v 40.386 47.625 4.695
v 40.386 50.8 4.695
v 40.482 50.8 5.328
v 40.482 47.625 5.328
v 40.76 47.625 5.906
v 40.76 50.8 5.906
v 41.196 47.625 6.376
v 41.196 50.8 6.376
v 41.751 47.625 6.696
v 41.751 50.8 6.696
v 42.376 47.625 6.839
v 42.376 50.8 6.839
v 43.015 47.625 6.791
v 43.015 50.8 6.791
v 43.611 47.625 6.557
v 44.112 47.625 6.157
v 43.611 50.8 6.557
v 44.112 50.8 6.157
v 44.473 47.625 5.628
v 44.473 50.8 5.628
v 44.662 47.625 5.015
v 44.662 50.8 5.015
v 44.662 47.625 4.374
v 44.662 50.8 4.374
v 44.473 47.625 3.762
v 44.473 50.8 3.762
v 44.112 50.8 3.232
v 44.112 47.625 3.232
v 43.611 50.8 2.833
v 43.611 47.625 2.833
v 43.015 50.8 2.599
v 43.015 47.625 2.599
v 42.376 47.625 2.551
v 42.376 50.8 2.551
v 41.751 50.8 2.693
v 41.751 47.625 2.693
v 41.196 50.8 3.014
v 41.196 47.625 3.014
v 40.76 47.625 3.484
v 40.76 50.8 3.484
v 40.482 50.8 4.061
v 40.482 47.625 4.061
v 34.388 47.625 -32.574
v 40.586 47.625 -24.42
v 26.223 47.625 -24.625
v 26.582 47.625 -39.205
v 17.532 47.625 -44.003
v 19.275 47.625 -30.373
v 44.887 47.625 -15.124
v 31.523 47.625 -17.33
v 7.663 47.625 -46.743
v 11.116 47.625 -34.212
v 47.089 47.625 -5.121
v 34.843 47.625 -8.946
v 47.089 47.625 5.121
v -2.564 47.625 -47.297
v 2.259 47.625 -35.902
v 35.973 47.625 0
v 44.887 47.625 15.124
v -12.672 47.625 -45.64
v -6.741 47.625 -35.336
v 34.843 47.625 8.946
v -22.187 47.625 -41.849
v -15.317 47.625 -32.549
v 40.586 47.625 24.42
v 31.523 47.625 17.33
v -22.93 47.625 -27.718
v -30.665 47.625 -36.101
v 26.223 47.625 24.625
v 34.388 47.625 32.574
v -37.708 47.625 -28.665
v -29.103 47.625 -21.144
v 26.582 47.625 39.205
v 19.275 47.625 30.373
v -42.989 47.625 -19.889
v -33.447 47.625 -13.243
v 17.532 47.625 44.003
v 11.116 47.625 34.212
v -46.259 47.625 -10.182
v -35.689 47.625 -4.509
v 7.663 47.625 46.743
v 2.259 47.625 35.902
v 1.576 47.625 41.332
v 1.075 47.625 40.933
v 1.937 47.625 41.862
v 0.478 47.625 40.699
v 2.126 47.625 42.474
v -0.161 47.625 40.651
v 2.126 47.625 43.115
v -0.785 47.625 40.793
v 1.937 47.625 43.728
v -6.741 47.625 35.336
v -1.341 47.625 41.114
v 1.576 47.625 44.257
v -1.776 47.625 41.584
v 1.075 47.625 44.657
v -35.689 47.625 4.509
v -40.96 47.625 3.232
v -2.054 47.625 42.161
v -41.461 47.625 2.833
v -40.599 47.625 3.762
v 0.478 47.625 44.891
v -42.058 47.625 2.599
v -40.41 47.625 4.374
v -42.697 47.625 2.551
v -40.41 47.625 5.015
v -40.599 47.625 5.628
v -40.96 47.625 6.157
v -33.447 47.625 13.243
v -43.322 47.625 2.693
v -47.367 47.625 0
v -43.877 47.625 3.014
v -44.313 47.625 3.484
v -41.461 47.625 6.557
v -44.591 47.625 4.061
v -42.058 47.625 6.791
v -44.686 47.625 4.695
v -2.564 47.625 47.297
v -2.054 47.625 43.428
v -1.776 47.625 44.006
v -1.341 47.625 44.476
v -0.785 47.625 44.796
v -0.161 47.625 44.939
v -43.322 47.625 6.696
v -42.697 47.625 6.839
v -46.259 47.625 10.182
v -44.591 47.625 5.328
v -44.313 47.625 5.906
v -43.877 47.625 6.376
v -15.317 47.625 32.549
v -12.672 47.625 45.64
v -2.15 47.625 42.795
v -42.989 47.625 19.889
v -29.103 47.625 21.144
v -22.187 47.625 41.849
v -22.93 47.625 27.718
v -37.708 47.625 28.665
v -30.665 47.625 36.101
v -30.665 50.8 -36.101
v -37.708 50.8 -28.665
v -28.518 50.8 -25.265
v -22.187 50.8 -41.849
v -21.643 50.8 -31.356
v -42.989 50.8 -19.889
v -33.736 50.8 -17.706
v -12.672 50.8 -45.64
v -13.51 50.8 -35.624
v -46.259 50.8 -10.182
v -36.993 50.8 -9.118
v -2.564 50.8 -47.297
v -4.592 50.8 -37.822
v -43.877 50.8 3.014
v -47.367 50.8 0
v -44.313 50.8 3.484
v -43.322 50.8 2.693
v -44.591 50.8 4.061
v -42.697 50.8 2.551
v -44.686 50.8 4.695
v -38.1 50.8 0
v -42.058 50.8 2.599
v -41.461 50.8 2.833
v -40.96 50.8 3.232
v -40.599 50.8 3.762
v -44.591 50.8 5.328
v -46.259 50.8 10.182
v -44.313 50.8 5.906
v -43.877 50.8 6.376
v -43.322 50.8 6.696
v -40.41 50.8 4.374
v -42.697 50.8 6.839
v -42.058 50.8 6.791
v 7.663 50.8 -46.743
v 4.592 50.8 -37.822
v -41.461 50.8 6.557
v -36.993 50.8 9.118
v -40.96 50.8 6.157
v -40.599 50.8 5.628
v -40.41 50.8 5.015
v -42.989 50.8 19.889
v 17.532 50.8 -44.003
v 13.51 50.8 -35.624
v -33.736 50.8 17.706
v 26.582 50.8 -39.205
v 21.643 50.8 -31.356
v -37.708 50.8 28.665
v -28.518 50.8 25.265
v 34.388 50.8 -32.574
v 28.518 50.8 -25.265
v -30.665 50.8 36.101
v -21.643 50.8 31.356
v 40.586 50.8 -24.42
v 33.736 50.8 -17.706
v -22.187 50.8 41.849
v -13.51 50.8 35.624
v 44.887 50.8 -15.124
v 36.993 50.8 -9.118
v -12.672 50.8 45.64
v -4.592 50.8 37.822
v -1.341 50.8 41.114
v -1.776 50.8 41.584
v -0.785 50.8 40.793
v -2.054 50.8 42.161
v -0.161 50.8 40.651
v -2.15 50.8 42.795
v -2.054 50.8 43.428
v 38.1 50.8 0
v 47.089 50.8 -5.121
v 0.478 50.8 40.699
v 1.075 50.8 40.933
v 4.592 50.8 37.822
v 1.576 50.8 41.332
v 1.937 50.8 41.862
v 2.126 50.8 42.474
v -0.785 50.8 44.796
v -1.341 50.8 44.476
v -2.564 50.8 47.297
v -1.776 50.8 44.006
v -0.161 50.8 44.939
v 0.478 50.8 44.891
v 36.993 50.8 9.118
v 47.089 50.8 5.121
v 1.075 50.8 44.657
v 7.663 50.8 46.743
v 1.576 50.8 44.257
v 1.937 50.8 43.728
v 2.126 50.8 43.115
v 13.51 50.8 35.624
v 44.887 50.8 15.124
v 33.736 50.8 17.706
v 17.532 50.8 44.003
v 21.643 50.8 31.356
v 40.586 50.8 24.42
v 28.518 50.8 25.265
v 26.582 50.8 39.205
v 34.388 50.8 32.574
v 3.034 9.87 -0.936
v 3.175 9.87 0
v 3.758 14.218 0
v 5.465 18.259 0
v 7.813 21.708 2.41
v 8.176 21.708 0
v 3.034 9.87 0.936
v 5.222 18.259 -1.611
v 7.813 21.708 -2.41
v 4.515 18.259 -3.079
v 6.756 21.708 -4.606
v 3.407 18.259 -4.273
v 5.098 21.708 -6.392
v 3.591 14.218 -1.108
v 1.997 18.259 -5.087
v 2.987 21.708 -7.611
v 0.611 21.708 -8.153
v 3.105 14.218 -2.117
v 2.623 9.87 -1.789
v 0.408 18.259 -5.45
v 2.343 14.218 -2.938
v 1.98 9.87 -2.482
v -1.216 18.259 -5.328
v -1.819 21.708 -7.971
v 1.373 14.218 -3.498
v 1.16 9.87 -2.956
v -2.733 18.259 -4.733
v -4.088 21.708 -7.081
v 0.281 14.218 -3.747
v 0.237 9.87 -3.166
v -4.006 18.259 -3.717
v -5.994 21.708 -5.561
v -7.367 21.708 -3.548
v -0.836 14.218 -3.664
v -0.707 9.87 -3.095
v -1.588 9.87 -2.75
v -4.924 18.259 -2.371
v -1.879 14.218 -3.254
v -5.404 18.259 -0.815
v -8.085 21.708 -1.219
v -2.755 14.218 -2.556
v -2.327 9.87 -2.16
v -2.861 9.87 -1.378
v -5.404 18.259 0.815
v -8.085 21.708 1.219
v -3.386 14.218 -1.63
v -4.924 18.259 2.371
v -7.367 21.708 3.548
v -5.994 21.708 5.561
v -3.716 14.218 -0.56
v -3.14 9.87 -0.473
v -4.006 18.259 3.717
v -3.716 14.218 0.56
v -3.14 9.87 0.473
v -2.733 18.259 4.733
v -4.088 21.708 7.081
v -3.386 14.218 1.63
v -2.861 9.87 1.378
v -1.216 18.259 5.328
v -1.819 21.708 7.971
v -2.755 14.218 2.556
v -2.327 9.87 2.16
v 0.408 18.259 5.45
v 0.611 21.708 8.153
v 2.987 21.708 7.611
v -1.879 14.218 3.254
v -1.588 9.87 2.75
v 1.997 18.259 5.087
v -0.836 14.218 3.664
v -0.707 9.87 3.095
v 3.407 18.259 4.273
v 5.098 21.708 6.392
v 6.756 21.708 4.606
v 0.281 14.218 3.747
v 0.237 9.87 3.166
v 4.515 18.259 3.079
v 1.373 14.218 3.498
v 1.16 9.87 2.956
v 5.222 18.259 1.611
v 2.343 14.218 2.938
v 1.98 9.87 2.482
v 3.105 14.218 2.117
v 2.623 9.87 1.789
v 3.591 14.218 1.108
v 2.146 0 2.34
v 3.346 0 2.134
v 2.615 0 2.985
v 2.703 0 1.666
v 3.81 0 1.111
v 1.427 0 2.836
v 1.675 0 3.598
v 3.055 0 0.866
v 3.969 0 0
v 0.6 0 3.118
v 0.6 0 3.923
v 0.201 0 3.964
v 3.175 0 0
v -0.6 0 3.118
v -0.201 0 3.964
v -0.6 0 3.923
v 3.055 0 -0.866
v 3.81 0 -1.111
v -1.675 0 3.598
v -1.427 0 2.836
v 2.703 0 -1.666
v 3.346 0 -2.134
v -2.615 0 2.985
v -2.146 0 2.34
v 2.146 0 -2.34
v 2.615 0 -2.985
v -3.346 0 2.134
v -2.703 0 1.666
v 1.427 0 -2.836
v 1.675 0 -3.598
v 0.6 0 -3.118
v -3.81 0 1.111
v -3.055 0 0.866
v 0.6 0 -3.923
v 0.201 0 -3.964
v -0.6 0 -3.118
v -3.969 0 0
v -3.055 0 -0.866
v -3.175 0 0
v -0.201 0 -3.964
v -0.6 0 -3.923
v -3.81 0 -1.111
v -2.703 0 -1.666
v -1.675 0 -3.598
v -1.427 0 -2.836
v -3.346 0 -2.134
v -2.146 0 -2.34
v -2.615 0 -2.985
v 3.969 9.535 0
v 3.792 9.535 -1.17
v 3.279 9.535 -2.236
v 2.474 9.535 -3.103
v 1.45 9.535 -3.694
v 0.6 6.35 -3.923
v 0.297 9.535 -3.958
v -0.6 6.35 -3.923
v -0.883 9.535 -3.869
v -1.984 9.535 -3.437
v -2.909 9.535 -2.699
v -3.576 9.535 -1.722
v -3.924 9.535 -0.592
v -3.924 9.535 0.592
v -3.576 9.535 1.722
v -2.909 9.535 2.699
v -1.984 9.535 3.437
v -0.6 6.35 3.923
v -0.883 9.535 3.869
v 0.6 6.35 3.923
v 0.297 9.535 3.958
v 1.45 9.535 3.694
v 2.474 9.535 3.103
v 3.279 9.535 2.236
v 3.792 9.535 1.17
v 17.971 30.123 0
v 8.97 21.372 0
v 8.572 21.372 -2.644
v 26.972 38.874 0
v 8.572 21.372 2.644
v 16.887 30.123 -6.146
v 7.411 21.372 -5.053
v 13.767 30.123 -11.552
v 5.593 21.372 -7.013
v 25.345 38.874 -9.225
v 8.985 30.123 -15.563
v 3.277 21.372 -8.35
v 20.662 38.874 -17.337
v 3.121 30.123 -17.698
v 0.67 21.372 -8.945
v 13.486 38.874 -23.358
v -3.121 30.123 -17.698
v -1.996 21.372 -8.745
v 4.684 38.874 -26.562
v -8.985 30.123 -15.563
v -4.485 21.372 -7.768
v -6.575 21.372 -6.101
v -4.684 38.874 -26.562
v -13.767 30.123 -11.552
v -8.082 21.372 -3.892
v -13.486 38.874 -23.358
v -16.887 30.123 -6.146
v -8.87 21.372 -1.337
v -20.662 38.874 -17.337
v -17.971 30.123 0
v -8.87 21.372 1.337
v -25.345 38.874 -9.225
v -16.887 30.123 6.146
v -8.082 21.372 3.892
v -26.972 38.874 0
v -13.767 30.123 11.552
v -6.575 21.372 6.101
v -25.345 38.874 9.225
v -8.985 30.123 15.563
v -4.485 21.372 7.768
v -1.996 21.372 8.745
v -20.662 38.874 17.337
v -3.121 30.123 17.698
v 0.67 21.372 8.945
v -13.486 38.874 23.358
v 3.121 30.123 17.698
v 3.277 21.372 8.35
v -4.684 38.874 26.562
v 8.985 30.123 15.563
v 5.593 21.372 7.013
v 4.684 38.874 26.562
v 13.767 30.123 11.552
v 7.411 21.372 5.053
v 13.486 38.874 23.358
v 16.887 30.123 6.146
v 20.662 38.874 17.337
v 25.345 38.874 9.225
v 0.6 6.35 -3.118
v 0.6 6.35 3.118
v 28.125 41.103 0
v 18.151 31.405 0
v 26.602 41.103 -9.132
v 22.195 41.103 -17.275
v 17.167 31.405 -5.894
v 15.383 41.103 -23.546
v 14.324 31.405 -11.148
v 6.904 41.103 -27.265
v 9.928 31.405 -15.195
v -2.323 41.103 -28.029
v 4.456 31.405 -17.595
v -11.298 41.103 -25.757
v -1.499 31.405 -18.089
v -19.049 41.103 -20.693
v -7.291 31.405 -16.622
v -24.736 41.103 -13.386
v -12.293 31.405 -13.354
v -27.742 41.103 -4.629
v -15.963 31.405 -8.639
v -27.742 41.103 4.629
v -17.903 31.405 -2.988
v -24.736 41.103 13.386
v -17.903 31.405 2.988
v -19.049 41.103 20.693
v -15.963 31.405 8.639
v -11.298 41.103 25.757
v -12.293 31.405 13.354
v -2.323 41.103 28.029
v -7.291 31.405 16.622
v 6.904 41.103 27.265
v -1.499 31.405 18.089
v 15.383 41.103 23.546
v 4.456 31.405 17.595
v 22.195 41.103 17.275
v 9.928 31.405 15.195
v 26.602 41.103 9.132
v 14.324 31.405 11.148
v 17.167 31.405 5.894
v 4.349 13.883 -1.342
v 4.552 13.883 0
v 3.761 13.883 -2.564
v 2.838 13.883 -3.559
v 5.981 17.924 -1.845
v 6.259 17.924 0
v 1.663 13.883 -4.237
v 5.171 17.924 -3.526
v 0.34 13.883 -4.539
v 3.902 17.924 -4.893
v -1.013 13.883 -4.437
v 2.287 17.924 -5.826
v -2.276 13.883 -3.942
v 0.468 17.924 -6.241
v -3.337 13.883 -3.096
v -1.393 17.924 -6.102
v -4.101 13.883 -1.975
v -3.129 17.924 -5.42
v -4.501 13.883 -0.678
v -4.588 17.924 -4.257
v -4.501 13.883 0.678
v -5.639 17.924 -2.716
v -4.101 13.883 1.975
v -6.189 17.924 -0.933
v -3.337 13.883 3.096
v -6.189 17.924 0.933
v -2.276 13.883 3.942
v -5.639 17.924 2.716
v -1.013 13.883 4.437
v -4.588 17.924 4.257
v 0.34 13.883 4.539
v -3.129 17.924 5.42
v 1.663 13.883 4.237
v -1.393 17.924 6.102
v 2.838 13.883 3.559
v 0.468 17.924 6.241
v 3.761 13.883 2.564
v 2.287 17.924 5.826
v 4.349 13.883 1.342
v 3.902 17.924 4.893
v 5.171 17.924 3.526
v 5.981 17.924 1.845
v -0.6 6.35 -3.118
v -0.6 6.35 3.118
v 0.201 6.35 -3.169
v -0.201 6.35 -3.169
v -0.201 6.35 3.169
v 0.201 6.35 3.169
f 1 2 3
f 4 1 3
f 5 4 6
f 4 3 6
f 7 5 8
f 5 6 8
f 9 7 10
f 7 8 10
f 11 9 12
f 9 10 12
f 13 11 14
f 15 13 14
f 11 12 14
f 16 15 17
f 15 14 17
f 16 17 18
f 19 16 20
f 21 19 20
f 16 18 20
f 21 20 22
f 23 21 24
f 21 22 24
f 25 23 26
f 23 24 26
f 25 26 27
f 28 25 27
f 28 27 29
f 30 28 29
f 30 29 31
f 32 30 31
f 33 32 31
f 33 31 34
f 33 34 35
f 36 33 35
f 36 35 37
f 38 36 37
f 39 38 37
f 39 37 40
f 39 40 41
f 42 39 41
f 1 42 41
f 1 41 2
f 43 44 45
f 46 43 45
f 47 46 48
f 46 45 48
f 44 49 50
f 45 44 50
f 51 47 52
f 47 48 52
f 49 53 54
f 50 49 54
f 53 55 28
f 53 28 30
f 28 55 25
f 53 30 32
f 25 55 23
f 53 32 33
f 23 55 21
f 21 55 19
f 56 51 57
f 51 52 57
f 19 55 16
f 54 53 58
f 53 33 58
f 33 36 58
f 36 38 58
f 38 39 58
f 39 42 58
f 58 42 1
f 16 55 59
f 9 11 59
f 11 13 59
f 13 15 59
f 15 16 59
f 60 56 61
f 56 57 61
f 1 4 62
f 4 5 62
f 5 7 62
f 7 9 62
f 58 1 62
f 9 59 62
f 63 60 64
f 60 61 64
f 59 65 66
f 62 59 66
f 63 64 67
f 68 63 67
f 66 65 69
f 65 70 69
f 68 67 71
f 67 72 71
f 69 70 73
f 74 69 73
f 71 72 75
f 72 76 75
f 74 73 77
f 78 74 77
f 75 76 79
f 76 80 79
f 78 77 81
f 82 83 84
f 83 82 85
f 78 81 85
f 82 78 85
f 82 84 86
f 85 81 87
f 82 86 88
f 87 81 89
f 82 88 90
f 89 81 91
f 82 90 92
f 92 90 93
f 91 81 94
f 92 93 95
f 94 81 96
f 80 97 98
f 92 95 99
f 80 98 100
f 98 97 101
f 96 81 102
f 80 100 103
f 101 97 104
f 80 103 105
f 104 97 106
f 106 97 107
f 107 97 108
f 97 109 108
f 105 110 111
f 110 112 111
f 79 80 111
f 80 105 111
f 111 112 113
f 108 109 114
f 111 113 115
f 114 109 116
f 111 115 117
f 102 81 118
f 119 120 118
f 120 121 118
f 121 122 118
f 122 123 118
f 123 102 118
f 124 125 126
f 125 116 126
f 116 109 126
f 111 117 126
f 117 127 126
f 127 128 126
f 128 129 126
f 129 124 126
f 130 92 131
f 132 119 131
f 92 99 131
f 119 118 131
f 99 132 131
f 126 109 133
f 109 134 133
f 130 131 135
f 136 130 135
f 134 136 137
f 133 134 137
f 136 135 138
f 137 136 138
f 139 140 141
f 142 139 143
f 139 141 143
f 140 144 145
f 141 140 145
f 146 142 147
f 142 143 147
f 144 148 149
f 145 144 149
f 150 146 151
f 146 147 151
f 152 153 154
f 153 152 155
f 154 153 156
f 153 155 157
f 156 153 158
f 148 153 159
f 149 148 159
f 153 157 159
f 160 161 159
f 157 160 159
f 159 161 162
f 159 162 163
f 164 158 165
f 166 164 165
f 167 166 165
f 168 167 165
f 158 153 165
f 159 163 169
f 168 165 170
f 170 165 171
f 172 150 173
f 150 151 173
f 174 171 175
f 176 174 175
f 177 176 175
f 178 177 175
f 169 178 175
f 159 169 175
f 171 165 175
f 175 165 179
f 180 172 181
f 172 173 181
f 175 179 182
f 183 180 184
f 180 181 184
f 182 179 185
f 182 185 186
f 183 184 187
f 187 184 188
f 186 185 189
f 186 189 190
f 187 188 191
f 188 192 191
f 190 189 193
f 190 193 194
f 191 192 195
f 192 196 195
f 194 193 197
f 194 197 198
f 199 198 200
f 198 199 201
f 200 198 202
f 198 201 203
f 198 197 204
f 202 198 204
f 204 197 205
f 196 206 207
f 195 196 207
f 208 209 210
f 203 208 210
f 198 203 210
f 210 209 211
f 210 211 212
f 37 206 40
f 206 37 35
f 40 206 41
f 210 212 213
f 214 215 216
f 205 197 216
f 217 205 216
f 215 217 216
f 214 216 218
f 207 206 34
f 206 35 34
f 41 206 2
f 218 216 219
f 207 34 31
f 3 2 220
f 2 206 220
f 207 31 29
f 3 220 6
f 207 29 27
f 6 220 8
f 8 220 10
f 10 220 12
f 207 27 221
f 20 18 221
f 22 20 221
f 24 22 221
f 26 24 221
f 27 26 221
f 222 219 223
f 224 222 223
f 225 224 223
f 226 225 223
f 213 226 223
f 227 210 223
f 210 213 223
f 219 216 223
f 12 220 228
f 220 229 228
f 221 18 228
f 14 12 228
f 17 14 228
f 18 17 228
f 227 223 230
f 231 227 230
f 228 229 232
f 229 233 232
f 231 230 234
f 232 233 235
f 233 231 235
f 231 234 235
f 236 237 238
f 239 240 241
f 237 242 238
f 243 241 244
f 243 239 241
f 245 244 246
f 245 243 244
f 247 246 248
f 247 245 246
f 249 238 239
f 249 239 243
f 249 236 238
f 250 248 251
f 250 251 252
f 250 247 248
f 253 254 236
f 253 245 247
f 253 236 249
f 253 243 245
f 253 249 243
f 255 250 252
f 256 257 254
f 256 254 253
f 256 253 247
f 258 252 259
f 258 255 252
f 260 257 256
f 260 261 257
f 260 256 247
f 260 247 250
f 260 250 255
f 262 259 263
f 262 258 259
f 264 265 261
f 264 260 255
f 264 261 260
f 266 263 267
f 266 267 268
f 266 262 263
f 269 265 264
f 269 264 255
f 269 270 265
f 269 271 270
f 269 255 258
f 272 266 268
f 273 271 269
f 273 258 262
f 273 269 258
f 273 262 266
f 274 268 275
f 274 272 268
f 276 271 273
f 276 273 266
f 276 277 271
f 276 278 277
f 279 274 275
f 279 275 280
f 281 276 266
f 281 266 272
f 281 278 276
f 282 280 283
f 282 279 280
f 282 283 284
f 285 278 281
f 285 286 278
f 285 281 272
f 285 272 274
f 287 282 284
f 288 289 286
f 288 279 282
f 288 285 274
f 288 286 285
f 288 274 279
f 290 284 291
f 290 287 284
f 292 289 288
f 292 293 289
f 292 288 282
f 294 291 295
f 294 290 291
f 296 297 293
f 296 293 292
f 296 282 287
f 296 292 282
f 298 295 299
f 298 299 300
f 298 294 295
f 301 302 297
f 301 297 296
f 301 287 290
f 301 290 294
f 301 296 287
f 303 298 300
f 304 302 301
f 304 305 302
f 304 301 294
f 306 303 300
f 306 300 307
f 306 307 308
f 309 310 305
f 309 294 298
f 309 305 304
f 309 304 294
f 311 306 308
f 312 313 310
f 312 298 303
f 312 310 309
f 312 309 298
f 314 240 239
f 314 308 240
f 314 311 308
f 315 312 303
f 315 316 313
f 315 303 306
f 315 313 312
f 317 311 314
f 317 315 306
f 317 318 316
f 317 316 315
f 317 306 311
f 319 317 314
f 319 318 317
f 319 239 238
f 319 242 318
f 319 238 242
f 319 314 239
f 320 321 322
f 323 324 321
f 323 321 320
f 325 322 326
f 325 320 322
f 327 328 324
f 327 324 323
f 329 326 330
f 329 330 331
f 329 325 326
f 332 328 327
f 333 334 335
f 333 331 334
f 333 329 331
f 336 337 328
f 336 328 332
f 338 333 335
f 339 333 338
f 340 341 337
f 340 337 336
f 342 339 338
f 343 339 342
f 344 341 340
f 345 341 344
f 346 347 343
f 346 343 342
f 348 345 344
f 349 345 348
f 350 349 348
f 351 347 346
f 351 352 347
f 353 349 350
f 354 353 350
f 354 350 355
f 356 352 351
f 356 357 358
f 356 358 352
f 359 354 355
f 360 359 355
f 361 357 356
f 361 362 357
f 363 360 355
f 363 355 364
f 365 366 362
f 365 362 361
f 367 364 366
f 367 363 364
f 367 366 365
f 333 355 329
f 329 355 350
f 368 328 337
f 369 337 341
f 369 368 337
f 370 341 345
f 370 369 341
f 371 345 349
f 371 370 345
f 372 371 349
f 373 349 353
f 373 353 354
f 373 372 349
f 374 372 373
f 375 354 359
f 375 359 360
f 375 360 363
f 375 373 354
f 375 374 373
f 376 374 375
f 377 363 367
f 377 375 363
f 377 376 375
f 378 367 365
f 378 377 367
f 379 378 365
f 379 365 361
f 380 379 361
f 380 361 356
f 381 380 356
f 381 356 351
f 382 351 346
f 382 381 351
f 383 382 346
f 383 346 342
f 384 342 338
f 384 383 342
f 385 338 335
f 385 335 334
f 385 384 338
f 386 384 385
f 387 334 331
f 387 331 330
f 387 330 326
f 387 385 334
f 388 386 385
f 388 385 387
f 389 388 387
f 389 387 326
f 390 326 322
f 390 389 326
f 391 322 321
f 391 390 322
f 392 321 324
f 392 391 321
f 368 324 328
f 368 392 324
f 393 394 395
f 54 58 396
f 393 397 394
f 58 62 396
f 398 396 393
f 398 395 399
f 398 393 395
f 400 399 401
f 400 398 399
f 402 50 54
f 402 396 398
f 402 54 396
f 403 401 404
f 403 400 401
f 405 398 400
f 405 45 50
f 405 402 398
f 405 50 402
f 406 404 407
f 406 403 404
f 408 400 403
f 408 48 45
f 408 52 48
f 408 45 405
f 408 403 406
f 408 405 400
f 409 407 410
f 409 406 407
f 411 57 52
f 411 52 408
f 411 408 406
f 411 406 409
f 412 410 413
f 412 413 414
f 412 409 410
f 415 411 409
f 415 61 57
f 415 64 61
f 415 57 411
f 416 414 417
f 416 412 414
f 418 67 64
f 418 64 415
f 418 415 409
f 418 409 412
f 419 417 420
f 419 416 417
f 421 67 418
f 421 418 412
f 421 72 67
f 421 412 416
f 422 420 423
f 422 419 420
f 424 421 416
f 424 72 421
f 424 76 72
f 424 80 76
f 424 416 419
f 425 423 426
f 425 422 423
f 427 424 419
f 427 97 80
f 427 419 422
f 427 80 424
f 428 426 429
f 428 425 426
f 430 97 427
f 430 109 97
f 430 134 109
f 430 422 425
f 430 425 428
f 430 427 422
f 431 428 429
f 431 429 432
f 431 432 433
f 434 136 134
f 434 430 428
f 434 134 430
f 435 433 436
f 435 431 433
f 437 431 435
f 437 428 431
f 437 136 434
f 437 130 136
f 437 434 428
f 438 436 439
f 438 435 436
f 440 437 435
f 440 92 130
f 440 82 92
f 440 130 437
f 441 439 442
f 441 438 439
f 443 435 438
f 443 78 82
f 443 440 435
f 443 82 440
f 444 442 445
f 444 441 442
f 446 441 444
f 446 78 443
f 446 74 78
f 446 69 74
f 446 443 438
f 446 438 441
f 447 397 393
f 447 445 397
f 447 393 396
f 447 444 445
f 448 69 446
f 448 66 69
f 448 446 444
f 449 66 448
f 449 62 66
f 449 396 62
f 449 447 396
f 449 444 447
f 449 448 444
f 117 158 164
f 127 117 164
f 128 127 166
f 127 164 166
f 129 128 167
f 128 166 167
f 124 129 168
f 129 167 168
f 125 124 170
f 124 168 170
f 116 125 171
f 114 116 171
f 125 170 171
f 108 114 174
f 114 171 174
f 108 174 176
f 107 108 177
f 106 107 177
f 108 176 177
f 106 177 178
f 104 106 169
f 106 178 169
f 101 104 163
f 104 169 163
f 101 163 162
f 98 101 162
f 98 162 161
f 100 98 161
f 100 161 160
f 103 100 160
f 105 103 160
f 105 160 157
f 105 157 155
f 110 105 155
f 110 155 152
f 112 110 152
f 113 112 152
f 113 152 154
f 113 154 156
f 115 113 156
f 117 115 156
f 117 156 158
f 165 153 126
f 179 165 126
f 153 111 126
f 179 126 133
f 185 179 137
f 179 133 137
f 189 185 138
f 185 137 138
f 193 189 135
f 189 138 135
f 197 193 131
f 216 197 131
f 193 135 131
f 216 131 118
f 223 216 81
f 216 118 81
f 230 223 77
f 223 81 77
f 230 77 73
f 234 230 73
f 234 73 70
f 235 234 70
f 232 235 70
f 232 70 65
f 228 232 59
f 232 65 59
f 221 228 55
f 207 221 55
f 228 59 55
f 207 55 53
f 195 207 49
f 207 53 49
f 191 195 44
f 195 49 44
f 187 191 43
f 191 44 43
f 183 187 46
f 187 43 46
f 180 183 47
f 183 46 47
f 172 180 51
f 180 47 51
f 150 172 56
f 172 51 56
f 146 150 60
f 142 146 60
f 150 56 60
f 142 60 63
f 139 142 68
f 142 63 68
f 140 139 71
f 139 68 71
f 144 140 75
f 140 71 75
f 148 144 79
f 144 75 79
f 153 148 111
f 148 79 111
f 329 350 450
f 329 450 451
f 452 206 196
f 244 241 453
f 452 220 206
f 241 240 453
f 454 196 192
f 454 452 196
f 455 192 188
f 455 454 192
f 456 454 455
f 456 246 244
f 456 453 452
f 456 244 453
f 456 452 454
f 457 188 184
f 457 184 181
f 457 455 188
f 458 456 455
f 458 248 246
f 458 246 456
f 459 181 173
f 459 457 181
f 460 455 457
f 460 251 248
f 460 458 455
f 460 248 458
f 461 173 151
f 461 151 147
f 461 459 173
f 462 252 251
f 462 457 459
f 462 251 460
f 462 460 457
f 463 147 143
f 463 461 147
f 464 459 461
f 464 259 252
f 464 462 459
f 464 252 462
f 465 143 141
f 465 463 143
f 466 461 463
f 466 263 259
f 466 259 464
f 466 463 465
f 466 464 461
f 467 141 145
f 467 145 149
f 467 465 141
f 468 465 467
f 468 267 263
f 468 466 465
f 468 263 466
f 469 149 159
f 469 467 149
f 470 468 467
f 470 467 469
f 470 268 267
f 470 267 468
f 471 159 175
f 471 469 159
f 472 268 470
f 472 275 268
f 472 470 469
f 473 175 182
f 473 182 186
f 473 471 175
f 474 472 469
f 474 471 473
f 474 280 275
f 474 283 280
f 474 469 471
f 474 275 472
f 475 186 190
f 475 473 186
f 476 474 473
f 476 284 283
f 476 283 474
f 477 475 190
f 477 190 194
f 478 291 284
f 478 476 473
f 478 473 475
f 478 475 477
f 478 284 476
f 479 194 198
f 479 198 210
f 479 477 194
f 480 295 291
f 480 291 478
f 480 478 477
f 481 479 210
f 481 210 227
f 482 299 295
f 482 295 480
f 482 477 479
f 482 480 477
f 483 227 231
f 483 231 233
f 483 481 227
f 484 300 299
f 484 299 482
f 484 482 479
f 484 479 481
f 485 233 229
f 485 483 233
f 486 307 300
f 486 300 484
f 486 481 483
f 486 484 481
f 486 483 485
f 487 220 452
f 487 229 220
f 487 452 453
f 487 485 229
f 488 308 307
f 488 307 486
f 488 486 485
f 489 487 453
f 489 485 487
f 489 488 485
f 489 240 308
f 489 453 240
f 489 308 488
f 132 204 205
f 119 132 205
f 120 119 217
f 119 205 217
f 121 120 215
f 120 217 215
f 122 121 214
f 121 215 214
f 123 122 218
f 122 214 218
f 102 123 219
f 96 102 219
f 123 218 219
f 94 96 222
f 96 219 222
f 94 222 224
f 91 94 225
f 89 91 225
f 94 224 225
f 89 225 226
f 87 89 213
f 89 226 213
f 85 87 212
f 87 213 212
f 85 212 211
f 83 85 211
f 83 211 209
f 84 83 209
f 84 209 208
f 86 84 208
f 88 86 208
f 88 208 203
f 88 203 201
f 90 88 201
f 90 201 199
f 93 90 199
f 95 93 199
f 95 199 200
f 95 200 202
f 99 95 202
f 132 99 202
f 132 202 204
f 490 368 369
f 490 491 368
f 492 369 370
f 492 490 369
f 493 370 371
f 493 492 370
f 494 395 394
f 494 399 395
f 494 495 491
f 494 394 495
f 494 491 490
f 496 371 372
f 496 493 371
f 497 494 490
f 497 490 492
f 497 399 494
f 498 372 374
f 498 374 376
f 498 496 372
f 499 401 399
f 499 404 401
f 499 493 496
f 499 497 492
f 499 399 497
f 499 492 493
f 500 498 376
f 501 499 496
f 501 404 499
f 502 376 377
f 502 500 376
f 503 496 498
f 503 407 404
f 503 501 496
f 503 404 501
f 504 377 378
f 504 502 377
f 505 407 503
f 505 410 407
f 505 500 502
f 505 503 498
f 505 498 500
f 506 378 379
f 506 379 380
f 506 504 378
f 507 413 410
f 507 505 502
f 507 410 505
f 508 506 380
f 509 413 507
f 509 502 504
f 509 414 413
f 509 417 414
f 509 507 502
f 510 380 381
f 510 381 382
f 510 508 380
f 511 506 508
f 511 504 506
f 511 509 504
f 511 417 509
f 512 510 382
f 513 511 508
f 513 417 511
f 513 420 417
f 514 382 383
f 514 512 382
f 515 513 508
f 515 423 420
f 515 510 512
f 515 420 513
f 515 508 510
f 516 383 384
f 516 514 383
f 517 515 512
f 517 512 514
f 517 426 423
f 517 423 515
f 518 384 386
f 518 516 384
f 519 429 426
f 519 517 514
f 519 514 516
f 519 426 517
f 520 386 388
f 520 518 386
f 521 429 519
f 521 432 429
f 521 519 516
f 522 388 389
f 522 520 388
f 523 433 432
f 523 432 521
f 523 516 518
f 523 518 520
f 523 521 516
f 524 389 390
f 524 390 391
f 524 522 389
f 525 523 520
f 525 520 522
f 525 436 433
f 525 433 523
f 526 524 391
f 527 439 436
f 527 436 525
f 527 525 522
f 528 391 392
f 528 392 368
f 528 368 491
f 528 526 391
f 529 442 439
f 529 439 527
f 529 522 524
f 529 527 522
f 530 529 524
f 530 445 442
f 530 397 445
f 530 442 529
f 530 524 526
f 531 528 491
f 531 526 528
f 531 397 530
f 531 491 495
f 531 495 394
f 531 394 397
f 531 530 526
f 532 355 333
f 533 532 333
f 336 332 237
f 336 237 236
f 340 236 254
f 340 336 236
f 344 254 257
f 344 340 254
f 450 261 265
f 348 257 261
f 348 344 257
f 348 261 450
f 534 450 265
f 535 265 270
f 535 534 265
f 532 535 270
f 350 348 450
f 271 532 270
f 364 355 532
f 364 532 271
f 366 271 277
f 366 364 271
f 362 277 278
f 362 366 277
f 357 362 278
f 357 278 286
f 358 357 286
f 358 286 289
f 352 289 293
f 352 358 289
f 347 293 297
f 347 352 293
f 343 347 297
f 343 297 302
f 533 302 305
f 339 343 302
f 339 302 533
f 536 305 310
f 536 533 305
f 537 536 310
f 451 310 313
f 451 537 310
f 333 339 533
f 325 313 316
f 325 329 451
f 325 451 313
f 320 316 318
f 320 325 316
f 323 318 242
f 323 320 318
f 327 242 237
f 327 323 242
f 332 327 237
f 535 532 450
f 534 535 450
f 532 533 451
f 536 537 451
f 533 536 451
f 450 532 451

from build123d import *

# Parameters (mm, degrees)
ESQUISSE3_R             = 2.15
ENL_V_MAT_EXTRU_1_DEPTH = 85.070480268
ESQUISSE4_W             = 1.2
ESQUISSE4_H             = 7.846267026
BOSS_EXTRU_1_DEPTH      = 6.35


with BuildPart() as part:
    # Esquisse1 → Révolution1 (revolve)
    with BuildSketch(Plane.XY):
        with BuildLine():
            Line((3.96875, 0), (3.96875, 9.534696006))
            ThreePointArc((3.96875, 9.534696006), (5.270377511, 15.960075858), (8.970022713, 21.372318074))
            Line((8.970022713, 21.372318074), (39.238684771, 50.8))
            Line((39.238684771, 50.8), (38.1, 50.8))
            Line((38.1, 50.8), (8.176272713, 21.707669228))
            ThreePointArc((8.176272713, 21.707669228), (4.476627511, 16.295427012), (3.175, 9.87004716))
            Line((3.175, 9.87004716), (3.175, 0))
            Line((3.175, 0), (3.96875, 0))
        make_face()
    revolve(axis=Axis((0, 0, 0), (0, 1, 0)))

    # Esquisse2 → Révolution2 (revolve)
    with BuildSketch(Plane.XY, mode=Mode.PRIVATE) as r_volution2_sk:
        Polygon((39.238684771, 50.8), (47.366684771, 50.8), (47.366684771, 47.625), (35.97295007, 47.625), align=None)
    revolve(r_volution2_sk.sketch.rotate(Axis((0, 0, 0), (0, 1, 0)), 180), axis=Axis((0, 0, 0), (0, 1, 0)))

    # Esquisse3 → Enlèv. mat.-Extru.1 (cut, through all)
    with BuildSketch(Plane(origin=(0, 50.8, 0), x_dir=(1, 0, 0), z_dir=(0, 1, 0))):
        with Locations(Location((0, -42.794684771, 0), (0, 0, 180))):
            Circle(ESQUISSE3_R)
        with Locations(Location((-42.53639594, -4.694684771, 0), (0, 0, 180))):
            Circle(ESQUISSE3_R)
        with Locations(Location((42.53639594, -4.694684771, 0), (0, 0, 180))):
            Circle(ESQUISSE3_R)
    extrude(amount=-ENL_V_MAT_EXTRU_1_DEPTH, mode=Mode.SUBTRACT)

    # Esquisse4 → Boss.-Extru.1 (add)
    with BuildSketch(Plane.XZ):
        Rectangle(ESQUISSE4_W, ESQUISSE4_H)
    extrude(amount=-BOSS_EXTRU_1_DEPTH)


solid = part.part
